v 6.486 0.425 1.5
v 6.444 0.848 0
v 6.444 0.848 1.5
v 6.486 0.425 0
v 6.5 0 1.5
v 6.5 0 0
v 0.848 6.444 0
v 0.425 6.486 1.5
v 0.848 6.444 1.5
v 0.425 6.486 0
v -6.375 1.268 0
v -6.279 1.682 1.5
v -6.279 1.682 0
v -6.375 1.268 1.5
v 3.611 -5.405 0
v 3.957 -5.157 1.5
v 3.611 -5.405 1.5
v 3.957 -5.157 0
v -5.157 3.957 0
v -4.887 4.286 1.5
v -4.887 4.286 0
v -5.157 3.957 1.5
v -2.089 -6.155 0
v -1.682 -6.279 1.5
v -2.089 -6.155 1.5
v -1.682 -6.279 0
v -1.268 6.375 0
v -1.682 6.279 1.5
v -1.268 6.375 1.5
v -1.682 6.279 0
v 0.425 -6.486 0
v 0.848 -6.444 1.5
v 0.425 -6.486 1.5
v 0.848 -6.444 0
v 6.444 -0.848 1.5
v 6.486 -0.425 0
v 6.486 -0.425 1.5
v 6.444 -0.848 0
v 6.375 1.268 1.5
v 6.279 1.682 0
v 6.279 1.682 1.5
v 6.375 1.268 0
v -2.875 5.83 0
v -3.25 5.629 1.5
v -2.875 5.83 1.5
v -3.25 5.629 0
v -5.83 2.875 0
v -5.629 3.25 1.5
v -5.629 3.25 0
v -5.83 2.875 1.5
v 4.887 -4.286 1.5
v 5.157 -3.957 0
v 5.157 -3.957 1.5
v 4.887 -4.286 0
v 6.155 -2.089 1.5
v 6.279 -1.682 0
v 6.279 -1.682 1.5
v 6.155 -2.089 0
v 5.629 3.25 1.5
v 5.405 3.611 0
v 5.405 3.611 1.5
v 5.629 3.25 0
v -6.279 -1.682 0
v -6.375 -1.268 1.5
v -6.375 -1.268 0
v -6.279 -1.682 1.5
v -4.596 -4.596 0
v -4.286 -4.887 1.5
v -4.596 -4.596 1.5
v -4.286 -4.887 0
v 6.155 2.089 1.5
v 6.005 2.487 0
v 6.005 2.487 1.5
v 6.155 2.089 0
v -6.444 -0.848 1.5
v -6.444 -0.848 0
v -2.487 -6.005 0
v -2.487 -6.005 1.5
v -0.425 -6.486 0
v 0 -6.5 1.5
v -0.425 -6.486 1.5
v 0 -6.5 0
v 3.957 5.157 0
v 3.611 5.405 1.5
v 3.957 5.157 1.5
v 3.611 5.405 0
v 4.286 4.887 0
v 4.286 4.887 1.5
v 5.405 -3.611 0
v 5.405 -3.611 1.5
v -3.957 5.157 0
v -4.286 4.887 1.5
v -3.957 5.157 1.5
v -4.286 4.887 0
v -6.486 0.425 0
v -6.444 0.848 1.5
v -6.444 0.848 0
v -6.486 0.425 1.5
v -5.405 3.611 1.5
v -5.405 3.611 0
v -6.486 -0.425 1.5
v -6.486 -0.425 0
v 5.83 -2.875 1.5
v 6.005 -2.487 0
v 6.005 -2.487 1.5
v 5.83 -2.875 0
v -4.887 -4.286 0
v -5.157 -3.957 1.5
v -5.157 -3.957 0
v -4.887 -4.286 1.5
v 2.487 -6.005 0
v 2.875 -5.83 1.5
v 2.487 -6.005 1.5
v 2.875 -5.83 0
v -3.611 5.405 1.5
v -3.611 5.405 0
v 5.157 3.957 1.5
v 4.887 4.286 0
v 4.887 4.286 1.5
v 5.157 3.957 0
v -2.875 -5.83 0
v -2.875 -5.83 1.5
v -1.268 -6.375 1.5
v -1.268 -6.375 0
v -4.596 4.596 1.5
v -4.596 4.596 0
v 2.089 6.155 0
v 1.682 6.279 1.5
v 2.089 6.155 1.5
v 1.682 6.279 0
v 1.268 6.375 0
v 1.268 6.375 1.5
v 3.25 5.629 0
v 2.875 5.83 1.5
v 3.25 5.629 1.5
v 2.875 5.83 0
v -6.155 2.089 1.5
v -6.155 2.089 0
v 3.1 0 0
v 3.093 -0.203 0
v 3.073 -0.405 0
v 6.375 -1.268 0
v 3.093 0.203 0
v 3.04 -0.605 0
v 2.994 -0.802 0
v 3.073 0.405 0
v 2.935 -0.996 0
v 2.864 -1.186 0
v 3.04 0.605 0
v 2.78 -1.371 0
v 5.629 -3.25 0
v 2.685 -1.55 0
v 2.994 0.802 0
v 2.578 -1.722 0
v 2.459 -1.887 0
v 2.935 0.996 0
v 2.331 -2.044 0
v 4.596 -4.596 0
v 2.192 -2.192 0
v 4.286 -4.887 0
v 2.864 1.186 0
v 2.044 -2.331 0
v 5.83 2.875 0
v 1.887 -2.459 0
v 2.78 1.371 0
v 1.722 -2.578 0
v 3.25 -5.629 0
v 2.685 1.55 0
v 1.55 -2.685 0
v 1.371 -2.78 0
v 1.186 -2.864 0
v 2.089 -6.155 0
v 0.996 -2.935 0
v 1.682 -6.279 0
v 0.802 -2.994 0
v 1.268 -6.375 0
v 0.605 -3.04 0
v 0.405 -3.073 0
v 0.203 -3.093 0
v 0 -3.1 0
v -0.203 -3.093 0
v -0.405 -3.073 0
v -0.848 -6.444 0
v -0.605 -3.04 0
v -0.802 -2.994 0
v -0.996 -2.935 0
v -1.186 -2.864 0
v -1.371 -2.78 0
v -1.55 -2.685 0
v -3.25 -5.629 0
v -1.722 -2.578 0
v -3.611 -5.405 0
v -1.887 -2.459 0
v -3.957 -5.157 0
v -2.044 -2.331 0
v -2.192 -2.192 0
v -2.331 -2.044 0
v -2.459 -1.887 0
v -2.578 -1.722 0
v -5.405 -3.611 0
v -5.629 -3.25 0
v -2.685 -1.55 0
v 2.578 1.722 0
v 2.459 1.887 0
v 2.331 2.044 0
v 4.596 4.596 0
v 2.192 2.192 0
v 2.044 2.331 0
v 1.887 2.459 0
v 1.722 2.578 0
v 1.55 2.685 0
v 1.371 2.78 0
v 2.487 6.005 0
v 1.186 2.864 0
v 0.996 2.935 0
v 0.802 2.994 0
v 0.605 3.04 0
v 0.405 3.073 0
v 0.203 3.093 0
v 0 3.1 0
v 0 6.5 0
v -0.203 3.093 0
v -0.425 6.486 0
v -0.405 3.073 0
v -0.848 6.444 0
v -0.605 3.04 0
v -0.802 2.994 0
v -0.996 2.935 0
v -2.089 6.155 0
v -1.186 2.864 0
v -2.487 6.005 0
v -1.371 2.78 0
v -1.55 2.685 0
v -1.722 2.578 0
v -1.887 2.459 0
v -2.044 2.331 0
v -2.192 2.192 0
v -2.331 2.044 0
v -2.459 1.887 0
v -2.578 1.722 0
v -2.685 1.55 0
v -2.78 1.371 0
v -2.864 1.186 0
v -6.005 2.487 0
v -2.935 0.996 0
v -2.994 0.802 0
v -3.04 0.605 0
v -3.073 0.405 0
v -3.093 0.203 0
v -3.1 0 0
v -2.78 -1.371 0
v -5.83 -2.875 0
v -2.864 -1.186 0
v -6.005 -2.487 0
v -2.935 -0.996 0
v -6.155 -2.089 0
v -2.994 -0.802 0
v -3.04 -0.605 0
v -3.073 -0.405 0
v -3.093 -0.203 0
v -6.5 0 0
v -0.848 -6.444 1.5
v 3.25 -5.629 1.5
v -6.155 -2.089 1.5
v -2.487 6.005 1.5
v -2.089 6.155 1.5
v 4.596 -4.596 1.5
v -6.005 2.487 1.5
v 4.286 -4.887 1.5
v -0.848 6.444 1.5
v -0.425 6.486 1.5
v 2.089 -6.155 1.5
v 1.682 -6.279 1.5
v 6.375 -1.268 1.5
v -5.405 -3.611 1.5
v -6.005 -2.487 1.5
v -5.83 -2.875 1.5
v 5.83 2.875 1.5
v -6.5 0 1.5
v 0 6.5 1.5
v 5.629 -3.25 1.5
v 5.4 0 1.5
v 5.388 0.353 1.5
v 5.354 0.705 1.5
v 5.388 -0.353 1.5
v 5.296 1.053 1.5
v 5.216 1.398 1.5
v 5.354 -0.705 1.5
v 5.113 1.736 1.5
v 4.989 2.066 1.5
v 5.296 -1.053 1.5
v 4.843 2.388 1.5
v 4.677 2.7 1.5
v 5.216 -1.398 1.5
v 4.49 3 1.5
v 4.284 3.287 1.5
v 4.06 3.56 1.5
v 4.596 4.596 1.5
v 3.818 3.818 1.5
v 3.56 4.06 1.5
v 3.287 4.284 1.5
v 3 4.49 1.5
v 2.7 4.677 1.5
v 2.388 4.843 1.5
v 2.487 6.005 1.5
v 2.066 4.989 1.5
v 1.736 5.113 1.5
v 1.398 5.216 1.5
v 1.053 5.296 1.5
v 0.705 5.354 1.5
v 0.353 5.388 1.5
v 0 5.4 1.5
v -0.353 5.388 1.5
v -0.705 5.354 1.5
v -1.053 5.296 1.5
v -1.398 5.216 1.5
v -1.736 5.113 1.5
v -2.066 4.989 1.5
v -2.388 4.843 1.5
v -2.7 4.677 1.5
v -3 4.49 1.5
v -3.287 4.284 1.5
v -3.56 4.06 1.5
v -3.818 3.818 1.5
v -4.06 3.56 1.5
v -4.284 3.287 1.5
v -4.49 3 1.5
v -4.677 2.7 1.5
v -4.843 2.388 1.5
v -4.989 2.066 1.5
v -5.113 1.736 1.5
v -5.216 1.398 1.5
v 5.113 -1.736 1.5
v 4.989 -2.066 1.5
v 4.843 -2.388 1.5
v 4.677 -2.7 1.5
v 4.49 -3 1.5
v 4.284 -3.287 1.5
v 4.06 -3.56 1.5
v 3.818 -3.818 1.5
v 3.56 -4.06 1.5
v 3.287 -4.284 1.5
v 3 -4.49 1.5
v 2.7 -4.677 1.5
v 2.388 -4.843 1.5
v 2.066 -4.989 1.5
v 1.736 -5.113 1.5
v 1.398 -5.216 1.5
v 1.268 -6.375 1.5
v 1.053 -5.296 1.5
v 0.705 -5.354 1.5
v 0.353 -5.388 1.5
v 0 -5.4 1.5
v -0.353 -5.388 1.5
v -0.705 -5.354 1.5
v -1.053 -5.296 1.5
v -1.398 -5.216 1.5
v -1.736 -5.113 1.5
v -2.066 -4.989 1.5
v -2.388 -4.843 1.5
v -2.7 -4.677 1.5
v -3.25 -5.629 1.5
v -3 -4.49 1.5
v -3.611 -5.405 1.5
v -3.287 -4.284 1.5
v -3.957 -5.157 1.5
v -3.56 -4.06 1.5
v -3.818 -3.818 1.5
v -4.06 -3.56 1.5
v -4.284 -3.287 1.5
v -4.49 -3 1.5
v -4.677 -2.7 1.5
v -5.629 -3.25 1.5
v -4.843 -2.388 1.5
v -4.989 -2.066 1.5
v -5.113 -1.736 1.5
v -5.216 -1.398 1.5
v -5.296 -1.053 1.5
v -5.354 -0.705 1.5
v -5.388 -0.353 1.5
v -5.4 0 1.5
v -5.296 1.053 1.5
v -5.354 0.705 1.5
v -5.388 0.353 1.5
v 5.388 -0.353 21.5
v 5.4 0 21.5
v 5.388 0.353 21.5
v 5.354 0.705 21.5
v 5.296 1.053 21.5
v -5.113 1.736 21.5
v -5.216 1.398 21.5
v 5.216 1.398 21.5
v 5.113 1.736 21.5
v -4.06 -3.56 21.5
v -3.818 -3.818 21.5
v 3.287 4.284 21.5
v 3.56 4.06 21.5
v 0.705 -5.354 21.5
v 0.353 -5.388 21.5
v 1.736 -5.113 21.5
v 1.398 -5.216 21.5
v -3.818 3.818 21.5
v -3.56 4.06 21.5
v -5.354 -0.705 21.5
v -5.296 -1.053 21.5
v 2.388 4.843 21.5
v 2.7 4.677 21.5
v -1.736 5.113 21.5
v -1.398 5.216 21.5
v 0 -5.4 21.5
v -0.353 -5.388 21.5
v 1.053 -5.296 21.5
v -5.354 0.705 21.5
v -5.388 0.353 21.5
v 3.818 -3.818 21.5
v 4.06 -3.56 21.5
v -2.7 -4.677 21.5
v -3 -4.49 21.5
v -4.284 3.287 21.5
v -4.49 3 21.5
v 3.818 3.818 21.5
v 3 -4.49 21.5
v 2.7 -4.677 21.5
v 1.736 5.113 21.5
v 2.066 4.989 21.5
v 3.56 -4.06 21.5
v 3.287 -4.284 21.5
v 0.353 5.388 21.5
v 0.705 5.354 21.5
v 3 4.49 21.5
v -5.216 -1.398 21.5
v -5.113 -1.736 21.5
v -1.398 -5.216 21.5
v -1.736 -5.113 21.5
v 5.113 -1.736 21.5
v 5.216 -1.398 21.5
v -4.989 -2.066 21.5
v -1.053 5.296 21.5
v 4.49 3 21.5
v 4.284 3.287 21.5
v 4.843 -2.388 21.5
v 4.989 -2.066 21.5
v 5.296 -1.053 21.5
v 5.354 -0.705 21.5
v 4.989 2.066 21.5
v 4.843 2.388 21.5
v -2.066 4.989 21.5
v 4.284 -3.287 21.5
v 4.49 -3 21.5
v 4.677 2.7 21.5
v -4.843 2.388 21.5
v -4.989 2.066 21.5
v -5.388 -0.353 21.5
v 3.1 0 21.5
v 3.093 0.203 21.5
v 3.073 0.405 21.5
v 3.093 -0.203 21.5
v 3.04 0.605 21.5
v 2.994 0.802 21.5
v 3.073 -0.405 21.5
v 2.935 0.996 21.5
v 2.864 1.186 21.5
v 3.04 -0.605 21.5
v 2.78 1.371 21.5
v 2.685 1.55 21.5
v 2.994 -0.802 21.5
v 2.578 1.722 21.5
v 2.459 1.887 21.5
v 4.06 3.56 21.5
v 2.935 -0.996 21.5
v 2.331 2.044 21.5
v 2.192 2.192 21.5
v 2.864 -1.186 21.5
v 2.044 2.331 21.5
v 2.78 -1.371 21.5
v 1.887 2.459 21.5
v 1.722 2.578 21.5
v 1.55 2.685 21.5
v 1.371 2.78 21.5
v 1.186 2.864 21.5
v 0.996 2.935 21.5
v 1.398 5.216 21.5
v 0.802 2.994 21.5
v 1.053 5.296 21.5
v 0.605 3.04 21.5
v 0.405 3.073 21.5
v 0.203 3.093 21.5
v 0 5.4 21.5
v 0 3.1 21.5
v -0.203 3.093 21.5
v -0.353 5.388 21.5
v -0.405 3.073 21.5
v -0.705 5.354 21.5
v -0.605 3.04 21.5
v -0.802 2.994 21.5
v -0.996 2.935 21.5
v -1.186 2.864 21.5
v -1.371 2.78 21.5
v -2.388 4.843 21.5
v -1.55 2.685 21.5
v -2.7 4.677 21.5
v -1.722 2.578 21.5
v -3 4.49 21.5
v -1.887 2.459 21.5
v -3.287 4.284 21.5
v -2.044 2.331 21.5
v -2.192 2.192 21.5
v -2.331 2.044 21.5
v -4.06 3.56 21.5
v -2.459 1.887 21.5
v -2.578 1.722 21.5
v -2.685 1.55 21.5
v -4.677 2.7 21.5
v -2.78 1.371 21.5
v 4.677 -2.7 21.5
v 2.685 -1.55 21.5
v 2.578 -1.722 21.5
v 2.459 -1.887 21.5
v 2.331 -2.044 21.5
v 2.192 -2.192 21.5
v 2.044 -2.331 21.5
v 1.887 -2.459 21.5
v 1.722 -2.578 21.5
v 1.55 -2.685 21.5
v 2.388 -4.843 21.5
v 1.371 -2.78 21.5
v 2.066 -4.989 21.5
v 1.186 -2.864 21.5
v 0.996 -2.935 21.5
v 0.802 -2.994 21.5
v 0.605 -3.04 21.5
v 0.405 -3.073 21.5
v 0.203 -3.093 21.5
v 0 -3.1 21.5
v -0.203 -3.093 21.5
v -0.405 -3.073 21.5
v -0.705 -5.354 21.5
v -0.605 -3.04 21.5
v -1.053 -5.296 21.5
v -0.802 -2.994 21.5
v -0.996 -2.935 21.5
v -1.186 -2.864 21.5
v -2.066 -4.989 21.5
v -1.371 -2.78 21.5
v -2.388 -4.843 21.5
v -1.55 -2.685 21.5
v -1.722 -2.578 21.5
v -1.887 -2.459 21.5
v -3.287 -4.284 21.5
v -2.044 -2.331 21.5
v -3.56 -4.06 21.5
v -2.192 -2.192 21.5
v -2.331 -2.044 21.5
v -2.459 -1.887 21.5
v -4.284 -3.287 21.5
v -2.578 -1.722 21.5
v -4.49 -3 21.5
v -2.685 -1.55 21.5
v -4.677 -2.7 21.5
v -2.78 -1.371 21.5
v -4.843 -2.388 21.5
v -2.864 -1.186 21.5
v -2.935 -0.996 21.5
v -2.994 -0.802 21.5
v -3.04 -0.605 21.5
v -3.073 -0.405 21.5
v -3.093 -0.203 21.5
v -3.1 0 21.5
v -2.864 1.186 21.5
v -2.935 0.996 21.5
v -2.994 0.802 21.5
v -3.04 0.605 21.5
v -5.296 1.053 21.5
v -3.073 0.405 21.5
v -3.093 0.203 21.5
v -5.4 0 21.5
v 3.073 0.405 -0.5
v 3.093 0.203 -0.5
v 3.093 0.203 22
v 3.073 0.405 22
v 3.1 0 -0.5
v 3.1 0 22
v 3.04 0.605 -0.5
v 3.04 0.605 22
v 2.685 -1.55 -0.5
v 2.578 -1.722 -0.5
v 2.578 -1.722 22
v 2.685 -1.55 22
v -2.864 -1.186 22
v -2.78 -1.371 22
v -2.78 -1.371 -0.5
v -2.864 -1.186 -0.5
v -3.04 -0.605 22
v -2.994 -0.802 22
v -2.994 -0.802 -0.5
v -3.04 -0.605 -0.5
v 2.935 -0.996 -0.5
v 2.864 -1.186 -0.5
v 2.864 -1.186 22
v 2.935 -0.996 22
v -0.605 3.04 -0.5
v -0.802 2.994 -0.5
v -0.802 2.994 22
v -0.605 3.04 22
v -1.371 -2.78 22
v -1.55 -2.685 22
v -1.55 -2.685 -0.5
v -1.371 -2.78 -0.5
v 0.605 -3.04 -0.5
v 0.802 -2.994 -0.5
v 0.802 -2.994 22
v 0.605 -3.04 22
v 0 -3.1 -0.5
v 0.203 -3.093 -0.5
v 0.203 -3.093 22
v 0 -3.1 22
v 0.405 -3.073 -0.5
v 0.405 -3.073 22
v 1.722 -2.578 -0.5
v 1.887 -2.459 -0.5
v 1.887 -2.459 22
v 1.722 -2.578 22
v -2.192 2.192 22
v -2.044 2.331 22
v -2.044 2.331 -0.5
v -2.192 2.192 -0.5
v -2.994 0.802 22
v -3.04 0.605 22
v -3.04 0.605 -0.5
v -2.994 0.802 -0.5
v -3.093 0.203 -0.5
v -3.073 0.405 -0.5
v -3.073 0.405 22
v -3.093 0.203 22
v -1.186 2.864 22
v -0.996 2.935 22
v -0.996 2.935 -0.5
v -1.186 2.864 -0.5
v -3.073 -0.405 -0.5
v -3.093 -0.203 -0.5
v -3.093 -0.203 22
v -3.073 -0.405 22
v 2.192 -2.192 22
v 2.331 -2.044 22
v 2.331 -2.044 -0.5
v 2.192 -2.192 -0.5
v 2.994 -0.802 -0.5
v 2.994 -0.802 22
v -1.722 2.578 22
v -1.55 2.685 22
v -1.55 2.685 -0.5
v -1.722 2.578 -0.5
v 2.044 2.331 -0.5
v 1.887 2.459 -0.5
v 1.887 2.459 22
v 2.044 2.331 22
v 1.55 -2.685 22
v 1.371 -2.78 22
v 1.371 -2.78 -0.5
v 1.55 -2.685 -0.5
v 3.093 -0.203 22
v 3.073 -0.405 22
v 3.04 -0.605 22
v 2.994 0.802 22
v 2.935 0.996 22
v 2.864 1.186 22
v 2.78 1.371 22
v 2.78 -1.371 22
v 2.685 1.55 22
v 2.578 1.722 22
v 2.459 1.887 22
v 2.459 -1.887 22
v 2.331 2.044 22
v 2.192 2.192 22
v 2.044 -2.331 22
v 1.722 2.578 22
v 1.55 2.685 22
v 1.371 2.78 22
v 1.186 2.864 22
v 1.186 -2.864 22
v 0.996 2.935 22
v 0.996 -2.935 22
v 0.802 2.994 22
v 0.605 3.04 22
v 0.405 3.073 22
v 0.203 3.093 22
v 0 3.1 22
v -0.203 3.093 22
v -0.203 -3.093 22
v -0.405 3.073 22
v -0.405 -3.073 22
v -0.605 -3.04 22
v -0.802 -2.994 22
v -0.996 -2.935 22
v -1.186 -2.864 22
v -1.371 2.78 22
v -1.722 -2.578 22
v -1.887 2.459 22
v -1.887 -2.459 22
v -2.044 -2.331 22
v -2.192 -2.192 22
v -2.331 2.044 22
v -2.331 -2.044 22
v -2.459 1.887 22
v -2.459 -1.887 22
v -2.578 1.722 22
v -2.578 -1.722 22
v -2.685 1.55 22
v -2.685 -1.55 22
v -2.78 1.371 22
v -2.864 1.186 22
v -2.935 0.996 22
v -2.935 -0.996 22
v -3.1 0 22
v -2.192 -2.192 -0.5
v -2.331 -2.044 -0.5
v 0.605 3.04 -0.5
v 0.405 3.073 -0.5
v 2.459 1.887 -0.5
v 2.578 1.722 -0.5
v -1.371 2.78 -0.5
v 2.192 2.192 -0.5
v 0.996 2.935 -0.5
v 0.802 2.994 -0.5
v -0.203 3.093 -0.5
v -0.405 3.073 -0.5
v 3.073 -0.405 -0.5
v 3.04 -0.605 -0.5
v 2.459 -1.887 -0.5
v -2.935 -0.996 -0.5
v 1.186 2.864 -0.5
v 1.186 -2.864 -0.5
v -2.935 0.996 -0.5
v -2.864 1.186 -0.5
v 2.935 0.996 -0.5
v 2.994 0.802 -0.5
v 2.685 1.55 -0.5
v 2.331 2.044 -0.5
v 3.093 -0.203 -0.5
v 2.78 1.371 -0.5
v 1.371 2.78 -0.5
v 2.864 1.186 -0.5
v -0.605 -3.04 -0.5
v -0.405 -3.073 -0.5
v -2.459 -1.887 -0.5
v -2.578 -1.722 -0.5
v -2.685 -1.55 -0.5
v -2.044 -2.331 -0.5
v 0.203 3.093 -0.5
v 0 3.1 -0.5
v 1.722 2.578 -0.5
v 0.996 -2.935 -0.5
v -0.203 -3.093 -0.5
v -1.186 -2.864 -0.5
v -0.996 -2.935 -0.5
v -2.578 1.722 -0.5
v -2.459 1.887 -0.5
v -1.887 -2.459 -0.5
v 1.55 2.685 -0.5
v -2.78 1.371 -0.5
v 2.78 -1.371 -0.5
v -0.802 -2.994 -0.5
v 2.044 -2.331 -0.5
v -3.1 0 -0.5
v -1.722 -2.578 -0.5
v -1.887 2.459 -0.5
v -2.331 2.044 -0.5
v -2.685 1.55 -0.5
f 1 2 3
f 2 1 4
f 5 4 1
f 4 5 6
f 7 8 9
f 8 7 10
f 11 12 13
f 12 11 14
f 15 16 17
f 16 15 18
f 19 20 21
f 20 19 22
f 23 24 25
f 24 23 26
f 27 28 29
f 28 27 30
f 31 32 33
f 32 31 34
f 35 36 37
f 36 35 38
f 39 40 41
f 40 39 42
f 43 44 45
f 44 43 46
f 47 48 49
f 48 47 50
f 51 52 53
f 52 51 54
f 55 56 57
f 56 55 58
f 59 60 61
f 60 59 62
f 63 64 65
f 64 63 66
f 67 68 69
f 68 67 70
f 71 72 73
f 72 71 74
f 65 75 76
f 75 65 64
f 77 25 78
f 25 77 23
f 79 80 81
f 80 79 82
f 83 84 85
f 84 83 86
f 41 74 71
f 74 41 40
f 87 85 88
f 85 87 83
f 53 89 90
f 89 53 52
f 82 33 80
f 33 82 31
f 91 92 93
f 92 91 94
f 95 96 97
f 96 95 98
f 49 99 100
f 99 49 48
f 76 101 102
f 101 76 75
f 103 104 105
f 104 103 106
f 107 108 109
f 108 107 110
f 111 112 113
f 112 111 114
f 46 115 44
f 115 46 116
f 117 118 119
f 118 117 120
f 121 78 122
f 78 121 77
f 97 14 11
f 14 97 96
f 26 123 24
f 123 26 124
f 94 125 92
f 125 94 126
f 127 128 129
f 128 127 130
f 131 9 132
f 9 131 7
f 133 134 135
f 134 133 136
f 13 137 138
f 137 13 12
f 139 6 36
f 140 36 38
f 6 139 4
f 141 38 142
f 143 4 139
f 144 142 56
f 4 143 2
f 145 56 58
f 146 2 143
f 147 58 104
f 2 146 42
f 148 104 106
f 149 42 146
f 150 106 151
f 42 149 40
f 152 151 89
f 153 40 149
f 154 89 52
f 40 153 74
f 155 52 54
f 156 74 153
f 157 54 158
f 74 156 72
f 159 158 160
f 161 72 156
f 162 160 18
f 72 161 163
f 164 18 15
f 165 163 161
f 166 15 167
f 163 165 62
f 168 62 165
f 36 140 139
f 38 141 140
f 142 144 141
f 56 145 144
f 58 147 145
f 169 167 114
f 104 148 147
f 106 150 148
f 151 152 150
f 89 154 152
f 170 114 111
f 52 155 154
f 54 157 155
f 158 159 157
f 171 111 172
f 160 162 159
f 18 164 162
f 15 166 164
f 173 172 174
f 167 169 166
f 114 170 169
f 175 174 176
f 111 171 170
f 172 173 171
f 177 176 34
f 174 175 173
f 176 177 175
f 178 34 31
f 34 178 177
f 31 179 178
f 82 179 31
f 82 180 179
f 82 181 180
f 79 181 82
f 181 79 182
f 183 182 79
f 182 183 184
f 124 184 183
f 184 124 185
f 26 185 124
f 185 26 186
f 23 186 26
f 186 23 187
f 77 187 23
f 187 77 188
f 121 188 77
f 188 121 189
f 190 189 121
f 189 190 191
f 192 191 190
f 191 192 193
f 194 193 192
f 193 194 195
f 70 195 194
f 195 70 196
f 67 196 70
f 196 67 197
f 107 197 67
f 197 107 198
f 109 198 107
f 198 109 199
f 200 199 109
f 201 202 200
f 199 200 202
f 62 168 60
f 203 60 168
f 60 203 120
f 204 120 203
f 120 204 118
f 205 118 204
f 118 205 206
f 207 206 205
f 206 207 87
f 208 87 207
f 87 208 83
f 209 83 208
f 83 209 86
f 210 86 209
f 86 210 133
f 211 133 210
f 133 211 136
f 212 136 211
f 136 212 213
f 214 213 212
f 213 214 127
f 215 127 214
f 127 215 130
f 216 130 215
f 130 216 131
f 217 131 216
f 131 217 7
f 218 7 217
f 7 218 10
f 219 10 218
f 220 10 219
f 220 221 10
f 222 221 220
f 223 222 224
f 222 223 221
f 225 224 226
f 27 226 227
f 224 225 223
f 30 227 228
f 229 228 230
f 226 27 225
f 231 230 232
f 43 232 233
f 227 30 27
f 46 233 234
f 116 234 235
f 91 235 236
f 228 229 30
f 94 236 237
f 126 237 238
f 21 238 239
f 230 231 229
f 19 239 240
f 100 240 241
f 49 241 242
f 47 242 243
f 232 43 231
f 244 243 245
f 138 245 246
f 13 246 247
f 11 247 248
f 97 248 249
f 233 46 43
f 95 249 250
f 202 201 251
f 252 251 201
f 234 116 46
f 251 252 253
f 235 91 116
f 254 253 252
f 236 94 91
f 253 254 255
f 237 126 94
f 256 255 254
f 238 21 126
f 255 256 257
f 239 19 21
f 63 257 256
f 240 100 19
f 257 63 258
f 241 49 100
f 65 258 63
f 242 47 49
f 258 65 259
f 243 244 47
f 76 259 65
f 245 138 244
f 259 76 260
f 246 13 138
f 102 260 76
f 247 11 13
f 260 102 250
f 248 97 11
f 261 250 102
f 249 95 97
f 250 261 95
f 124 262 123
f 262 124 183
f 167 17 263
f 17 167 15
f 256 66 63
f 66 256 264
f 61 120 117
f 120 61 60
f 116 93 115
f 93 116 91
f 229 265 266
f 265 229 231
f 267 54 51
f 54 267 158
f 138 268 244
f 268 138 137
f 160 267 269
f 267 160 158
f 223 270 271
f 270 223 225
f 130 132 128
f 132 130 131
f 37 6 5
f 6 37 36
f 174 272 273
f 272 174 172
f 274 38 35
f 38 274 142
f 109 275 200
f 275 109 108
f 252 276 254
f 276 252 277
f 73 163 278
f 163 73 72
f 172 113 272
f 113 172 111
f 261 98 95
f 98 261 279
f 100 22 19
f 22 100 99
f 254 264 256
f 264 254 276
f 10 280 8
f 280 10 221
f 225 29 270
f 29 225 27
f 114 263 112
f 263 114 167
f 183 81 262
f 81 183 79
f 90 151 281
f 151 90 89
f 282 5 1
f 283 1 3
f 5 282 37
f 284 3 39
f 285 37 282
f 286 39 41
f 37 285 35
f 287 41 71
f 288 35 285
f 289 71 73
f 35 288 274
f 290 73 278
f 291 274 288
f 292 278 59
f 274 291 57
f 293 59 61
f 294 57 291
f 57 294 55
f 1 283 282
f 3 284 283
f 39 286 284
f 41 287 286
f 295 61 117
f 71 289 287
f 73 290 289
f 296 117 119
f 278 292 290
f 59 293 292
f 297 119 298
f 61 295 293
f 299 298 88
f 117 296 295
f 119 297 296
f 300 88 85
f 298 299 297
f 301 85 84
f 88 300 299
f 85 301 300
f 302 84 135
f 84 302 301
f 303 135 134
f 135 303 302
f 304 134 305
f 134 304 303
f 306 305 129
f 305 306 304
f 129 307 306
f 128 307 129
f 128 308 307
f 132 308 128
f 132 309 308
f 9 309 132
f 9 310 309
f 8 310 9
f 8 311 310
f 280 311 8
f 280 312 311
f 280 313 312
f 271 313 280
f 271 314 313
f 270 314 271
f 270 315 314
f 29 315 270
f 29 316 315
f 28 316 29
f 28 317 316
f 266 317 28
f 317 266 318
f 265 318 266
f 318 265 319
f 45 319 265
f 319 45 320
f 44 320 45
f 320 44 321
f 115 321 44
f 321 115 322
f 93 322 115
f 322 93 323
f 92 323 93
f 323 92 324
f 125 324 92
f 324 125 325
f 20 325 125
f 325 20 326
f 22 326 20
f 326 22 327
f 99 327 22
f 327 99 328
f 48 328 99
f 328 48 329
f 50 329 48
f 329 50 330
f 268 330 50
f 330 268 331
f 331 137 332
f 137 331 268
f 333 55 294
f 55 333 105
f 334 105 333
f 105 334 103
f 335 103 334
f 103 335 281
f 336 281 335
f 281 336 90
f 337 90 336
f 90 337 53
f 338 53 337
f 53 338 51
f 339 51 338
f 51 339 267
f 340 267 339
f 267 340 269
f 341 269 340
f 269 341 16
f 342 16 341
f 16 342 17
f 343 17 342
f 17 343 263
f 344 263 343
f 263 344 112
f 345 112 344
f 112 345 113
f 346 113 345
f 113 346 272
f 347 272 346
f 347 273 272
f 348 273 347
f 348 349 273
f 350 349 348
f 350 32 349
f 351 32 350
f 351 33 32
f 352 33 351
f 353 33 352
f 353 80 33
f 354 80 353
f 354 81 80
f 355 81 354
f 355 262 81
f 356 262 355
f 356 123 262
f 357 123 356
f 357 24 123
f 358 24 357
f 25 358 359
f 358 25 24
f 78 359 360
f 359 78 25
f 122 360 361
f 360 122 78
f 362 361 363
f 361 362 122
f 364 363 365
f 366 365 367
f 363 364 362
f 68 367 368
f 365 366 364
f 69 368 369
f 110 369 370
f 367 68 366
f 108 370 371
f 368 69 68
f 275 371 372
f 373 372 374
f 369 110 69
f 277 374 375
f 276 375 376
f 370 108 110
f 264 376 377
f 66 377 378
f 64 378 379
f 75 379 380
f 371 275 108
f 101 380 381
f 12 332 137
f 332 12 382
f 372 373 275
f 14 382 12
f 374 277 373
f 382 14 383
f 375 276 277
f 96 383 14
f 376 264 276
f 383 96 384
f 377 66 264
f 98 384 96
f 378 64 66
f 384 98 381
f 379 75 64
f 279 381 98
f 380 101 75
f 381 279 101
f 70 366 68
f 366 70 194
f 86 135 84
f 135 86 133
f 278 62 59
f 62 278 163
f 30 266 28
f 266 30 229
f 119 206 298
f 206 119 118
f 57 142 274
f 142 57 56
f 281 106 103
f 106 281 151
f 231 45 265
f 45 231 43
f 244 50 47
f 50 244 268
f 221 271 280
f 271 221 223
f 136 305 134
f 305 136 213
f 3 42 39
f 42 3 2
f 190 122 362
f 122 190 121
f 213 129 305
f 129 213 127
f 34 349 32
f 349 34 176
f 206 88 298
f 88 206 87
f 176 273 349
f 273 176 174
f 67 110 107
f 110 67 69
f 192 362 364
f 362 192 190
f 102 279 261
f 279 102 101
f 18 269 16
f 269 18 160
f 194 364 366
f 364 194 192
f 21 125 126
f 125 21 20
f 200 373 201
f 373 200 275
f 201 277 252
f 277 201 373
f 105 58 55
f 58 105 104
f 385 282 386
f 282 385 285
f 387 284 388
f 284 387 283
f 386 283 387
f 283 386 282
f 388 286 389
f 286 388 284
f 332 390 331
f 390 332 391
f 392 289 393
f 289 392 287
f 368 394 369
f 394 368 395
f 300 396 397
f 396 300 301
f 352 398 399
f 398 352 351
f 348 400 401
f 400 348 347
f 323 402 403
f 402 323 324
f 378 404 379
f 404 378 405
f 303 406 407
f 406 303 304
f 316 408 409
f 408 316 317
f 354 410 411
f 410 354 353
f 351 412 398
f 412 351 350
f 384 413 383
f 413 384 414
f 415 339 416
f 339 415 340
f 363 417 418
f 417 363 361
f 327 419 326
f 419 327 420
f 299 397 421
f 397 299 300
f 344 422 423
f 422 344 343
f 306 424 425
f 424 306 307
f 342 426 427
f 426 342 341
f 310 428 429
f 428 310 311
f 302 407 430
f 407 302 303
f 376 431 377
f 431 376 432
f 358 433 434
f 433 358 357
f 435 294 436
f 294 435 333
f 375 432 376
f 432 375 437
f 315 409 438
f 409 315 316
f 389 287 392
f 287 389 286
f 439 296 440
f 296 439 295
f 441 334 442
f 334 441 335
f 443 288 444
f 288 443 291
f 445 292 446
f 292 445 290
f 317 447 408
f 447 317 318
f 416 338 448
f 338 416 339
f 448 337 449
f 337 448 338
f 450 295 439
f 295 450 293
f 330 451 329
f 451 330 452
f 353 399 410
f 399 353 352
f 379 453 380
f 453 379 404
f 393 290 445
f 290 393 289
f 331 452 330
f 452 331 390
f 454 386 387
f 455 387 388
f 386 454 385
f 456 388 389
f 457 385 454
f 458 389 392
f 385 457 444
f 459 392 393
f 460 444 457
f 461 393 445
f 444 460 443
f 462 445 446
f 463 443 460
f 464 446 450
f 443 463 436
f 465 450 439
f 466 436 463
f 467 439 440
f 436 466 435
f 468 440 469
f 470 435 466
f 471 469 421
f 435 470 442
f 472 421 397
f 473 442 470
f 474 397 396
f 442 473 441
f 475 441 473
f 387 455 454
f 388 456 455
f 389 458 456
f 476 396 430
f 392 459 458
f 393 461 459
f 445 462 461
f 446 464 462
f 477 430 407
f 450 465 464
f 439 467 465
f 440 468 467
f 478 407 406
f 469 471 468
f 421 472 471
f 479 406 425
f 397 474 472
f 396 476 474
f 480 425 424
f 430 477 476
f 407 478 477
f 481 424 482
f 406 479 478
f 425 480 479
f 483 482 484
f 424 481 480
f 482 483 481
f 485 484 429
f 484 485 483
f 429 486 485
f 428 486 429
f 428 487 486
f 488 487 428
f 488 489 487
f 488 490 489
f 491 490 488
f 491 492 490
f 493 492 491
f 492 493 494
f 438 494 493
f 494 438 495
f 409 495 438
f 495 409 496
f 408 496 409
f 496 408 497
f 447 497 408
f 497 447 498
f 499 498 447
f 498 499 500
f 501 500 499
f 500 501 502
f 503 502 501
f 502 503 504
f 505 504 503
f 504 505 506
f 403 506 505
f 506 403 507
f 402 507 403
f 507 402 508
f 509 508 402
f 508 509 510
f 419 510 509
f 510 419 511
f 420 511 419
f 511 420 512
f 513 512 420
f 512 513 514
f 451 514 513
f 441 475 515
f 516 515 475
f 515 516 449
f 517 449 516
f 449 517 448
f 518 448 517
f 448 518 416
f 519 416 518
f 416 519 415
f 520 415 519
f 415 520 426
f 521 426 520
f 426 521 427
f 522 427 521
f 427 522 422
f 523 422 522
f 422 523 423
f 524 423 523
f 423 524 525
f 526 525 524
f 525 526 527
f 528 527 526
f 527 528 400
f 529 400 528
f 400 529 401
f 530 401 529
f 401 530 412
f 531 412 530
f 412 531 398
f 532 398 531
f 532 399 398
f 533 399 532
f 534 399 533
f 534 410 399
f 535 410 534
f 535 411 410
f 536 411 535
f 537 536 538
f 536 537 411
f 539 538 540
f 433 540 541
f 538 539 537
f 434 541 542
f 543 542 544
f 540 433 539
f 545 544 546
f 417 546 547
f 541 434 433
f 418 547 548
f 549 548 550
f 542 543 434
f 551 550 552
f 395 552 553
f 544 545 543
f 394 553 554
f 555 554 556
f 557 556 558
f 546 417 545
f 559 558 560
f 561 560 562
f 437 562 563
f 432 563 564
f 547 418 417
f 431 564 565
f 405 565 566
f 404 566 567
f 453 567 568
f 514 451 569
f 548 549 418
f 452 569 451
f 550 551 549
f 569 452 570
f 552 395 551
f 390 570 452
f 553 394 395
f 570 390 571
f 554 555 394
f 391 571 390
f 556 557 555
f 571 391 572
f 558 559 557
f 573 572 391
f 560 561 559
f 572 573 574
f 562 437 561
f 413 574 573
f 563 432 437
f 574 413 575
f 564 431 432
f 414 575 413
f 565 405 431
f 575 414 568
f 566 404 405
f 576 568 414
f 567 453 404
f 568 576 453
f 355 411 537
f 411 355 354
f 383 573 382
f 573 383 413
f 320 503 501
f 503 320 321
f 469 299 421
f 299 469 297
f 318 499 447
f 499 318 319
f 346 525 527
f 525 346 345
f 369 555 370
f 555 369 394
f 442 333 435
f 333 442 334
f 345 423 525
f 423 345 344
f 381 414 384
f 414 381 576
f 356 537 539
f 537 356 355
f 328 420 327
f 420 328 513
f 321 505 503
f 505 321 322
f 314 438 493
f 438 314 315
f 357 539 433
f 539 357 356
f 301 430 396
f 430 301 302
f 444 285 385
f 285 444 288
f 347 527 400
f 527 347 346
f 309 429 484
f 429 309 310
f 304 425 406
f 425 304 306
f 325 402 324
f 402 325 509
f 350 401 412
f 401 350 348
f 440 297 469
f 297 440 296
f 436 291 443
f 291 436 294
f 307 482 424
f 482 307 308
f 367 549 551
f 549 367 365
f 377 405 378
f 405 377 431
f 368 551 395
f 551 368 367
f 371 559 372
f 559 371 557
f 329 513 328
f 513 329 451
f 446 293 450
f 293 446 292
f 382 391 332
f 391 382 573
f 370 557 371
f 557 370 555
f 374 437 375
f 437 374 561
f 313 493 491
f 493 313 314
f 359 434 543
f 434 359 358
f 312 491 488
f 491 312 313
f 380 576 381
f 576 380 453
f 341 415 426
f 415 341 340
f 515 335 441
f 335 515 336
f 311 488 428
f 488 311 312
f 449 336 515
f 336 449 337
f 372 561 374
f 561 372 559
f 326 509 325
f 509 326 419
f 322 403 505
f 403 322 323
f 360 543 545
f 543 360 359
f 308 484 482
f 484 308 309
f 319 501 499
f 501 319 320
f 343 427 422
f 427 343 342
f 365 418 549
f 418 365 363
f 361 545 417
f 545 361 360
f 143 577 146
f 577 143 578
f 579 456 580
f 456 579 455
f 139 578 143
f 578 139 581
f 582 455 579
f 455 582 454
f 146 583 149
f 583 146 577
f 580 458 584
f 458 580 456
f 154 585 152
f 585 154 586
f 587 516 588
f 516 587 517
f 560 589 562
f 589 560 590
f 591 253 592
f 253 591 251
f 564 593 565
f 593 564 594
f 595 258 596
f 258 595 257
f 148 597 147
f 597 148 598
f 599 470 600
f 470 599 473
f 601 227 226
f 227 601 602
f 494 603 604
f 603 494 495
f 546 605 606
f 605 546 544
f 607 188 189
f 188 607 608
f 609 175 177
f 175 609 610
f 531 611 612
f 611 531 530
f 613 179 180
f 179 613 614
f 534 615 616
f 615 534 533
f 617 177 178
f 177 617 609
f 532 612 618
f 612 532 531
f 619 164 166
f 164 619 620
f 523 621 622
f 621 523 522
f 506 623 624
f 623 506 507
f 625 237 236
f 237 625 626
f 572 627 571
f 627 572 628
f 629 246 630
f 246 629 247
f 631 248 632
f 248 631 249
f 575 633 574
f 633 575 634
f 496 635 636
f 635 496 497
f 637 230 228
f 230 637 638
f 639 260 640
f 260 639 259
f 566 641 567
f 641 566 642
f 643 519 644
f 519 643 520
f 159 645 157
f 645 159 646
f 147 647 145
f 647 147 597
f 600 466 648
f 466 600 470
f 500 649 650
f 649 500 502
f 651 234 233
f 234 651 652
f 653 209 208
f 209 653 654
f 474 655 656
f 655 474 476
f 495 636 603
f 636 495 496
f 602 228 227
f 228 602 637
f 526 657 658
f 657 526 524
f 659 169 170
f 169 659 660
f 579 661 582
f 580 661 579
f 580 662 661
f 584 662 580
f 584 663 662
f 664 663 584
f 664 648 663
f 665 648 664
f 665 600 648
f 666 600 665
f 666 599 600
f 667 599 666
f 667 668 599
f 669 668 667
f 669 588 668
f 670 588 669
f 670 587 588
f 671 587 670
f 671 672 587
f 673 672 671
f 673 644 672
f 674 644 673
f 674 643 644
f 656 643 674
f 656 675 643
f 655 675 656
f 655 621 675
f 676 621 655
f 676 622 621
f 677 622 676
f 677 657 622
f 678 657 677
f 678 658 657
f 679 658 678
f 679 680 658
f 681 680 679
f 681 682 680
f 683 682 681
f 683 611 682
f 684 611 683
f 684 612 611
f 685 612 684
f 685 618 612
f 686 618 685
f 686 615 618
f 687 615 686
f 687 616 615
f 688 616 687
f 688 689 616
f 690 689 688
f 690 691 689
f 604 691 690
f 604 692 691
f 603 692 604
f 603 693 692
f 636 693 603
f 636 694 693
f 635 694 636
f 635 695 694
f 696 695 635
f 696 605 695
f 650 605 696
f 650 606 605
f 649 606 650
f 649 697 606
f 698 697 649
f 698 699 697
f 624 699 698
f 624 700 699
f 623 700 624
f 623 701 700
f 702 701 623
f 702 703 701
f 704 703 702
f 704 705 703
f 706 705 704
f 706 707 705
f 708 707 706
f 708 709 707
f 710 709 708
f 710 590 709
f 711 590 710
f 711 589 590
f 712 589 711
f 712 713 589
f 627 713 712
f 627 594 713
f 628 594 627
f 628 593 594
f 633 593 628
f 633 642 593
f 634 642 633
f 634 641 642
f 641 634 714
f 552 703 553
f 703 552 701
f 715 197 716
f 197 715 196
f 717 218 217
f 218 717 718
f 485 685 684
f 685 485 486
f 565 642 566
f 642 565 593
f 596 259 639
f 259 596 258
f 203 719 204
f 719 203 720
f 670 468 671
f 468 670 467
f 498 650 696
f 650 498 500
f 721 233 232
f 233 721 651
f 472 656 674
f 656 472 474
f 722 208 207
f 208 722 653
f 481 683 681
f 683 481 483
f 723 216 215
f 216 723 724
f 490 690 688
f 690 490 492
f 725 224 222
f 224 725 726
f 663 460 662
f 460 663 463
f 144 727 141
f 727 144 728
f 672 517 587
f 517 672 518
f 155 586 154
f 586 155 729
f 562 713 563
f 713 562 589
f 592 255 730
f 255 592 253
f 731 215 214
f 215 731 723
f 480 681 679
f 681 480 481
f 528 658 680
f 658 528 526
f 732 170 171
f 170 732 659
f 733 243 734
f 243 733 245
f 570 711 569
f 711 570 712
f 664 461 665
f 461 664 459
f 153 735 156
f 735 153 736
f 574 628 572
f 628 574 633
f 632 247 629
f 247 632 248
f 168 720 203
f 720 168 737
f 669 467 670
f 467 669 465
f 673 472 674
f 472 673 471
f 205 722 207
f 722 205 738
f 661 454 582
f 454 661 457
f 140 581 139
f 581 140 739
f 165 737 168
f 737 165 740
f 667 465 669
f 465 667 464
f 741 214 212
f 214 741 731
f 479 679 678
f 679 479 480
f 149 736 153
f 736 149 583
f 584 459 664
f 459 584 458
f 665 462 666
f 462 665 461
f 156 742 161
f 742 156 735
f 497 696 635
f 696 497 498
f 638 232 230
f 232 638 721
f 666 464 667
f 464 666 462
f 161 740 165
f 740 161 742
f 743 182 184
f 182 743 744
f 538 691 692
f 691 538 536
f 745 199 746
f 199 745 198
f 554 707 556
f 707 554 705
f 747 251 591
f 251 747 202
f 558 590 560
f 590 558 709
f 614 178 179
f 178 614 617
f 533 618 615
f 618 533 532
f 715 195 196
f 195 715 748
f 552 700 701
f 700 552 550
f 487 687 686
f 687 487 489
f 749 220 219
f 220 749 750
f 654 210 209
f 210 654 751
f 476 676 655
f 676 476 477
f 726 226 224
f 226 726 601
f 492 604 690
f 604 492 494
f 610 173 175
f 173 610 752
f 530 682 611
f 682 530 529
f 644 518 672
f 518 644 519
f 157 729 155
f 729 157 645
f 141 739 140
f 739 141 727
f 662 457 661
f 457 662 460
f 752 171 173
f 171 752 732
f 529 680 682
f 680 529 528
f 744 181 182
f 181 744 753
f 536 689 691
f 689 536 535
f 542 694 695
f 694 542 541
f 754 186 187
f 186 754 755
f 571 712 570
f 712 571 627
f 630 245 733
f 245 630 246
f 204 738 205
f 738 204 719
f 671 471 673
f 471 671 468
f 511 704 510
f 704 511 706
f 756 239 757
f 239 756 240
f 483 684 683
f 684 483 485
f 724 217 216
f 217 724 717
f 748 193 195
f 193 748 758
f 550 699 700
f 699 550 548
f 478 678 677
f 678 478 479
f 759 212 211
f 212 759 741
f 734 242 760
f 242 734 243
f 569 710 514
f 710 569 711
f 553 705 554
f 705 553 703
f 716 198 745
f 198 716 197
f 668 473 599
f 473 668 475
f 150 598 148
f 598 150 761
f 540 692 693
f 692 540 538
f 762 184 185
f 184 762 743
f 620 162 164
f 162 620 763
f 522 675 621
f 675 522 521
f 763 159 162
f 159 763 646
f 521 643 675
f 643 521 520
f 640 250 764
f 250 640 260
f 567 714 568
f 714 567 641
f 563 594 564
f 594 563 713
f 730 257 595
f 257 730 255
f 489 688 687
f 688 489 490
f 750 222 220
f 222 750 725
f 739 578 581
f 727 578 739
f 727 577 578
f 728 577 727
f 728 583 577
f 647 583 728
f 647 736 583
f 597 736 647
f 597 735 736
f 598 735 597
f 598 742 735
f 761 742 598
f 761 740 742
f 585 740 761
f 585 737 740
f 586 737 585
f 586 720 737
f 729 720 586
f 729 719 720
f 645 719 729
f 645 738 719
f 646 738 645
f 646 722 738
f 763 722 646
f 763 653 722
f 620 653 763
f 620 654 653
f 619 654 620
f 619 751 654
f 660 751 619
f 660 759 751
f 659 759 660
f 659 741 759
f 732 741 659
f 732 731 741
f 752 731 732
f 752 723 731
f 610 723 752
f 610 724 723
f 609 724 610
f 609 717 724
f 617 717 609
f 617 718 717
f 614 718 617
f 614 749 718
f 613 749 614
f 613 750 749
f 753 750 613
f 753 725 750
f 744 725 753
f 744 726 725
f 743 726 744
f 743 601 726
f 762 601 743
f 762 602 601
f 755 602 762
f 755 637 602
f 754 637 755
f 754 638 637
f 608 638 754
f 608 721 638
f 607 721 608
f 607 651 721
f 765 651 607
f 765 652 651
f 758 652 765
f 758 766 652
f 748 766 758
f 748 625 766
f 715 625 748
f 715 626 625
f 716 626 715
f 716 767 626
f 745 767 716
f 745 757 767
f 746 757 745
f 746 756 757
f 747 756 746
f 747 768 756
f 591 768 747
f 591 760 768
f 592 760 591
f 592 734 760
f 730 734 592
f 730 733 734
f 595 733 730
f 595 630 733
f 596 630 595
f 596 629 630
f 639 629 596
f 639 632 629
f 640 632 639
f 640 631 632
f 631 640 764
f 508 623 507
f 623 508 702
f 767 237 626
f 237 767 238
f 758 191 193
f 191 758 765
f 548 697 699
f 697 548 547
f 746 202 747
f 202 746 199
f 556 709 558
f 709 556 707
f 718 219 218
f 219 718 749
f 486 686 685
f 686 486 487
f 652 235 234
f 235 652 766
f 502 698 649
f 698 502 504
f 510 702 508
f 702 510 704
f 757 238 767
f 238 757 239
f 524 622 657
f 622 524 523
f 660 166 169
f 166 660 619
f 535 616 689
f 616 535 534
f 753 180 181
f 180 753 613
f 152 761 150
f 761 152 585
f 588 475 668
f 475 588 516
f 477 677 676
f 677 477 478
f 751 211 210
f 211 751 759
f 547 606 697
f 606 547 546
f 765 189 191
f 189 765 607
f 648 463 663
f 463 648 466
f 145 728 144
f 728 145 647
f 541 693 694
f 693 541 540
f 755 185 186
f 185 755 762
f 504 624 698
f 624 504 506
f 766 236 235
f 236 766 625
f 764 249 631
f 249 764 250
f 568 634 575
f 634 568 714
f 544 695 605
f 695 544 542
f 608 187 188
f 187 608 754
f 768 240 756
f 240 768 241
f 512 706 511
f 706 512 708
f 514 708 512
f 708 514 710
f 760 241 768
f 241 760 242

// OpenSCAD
// PCR tube adapter sleeve: fits a 0.2 mL tube into a 1.5 mL rack hole
// Print orientation: collar on the bed (z = 0), sleeve body builds upward

// ---------- Parameters ----------
collar_d        = 13;    // collar outer diameter
collar_t        = 1.5;   // collar thickness (z = 0 to 1.5)
sleeve_d        = 10.8;  // sleeve body outer diameter
sleeve_h        = 20;    // sleeve body height above collar (z = 1.5 to 21.5)
bore_d          = 6.2;   // through-bore diameter
eps             = 0.5;   // cutter overshoot past faces

$fn = 96;

// ---------- Model ----------
union() {
    // Collar
    cylinder(d = collar_d, h = collar_t);

    // Sleeve body (slightly overlapping the collar into a clean union)
    translate([0, 0, collar_t - 0.01])
        cylinder(d = sleeve_d, h = sleeve_h + 0.01);
}

// Full-height bore, open at both ends
translate([0, 0, -eps])
    cylinder(d = bore_d, h = collar_t + sleeve_h + 2 * eps);
